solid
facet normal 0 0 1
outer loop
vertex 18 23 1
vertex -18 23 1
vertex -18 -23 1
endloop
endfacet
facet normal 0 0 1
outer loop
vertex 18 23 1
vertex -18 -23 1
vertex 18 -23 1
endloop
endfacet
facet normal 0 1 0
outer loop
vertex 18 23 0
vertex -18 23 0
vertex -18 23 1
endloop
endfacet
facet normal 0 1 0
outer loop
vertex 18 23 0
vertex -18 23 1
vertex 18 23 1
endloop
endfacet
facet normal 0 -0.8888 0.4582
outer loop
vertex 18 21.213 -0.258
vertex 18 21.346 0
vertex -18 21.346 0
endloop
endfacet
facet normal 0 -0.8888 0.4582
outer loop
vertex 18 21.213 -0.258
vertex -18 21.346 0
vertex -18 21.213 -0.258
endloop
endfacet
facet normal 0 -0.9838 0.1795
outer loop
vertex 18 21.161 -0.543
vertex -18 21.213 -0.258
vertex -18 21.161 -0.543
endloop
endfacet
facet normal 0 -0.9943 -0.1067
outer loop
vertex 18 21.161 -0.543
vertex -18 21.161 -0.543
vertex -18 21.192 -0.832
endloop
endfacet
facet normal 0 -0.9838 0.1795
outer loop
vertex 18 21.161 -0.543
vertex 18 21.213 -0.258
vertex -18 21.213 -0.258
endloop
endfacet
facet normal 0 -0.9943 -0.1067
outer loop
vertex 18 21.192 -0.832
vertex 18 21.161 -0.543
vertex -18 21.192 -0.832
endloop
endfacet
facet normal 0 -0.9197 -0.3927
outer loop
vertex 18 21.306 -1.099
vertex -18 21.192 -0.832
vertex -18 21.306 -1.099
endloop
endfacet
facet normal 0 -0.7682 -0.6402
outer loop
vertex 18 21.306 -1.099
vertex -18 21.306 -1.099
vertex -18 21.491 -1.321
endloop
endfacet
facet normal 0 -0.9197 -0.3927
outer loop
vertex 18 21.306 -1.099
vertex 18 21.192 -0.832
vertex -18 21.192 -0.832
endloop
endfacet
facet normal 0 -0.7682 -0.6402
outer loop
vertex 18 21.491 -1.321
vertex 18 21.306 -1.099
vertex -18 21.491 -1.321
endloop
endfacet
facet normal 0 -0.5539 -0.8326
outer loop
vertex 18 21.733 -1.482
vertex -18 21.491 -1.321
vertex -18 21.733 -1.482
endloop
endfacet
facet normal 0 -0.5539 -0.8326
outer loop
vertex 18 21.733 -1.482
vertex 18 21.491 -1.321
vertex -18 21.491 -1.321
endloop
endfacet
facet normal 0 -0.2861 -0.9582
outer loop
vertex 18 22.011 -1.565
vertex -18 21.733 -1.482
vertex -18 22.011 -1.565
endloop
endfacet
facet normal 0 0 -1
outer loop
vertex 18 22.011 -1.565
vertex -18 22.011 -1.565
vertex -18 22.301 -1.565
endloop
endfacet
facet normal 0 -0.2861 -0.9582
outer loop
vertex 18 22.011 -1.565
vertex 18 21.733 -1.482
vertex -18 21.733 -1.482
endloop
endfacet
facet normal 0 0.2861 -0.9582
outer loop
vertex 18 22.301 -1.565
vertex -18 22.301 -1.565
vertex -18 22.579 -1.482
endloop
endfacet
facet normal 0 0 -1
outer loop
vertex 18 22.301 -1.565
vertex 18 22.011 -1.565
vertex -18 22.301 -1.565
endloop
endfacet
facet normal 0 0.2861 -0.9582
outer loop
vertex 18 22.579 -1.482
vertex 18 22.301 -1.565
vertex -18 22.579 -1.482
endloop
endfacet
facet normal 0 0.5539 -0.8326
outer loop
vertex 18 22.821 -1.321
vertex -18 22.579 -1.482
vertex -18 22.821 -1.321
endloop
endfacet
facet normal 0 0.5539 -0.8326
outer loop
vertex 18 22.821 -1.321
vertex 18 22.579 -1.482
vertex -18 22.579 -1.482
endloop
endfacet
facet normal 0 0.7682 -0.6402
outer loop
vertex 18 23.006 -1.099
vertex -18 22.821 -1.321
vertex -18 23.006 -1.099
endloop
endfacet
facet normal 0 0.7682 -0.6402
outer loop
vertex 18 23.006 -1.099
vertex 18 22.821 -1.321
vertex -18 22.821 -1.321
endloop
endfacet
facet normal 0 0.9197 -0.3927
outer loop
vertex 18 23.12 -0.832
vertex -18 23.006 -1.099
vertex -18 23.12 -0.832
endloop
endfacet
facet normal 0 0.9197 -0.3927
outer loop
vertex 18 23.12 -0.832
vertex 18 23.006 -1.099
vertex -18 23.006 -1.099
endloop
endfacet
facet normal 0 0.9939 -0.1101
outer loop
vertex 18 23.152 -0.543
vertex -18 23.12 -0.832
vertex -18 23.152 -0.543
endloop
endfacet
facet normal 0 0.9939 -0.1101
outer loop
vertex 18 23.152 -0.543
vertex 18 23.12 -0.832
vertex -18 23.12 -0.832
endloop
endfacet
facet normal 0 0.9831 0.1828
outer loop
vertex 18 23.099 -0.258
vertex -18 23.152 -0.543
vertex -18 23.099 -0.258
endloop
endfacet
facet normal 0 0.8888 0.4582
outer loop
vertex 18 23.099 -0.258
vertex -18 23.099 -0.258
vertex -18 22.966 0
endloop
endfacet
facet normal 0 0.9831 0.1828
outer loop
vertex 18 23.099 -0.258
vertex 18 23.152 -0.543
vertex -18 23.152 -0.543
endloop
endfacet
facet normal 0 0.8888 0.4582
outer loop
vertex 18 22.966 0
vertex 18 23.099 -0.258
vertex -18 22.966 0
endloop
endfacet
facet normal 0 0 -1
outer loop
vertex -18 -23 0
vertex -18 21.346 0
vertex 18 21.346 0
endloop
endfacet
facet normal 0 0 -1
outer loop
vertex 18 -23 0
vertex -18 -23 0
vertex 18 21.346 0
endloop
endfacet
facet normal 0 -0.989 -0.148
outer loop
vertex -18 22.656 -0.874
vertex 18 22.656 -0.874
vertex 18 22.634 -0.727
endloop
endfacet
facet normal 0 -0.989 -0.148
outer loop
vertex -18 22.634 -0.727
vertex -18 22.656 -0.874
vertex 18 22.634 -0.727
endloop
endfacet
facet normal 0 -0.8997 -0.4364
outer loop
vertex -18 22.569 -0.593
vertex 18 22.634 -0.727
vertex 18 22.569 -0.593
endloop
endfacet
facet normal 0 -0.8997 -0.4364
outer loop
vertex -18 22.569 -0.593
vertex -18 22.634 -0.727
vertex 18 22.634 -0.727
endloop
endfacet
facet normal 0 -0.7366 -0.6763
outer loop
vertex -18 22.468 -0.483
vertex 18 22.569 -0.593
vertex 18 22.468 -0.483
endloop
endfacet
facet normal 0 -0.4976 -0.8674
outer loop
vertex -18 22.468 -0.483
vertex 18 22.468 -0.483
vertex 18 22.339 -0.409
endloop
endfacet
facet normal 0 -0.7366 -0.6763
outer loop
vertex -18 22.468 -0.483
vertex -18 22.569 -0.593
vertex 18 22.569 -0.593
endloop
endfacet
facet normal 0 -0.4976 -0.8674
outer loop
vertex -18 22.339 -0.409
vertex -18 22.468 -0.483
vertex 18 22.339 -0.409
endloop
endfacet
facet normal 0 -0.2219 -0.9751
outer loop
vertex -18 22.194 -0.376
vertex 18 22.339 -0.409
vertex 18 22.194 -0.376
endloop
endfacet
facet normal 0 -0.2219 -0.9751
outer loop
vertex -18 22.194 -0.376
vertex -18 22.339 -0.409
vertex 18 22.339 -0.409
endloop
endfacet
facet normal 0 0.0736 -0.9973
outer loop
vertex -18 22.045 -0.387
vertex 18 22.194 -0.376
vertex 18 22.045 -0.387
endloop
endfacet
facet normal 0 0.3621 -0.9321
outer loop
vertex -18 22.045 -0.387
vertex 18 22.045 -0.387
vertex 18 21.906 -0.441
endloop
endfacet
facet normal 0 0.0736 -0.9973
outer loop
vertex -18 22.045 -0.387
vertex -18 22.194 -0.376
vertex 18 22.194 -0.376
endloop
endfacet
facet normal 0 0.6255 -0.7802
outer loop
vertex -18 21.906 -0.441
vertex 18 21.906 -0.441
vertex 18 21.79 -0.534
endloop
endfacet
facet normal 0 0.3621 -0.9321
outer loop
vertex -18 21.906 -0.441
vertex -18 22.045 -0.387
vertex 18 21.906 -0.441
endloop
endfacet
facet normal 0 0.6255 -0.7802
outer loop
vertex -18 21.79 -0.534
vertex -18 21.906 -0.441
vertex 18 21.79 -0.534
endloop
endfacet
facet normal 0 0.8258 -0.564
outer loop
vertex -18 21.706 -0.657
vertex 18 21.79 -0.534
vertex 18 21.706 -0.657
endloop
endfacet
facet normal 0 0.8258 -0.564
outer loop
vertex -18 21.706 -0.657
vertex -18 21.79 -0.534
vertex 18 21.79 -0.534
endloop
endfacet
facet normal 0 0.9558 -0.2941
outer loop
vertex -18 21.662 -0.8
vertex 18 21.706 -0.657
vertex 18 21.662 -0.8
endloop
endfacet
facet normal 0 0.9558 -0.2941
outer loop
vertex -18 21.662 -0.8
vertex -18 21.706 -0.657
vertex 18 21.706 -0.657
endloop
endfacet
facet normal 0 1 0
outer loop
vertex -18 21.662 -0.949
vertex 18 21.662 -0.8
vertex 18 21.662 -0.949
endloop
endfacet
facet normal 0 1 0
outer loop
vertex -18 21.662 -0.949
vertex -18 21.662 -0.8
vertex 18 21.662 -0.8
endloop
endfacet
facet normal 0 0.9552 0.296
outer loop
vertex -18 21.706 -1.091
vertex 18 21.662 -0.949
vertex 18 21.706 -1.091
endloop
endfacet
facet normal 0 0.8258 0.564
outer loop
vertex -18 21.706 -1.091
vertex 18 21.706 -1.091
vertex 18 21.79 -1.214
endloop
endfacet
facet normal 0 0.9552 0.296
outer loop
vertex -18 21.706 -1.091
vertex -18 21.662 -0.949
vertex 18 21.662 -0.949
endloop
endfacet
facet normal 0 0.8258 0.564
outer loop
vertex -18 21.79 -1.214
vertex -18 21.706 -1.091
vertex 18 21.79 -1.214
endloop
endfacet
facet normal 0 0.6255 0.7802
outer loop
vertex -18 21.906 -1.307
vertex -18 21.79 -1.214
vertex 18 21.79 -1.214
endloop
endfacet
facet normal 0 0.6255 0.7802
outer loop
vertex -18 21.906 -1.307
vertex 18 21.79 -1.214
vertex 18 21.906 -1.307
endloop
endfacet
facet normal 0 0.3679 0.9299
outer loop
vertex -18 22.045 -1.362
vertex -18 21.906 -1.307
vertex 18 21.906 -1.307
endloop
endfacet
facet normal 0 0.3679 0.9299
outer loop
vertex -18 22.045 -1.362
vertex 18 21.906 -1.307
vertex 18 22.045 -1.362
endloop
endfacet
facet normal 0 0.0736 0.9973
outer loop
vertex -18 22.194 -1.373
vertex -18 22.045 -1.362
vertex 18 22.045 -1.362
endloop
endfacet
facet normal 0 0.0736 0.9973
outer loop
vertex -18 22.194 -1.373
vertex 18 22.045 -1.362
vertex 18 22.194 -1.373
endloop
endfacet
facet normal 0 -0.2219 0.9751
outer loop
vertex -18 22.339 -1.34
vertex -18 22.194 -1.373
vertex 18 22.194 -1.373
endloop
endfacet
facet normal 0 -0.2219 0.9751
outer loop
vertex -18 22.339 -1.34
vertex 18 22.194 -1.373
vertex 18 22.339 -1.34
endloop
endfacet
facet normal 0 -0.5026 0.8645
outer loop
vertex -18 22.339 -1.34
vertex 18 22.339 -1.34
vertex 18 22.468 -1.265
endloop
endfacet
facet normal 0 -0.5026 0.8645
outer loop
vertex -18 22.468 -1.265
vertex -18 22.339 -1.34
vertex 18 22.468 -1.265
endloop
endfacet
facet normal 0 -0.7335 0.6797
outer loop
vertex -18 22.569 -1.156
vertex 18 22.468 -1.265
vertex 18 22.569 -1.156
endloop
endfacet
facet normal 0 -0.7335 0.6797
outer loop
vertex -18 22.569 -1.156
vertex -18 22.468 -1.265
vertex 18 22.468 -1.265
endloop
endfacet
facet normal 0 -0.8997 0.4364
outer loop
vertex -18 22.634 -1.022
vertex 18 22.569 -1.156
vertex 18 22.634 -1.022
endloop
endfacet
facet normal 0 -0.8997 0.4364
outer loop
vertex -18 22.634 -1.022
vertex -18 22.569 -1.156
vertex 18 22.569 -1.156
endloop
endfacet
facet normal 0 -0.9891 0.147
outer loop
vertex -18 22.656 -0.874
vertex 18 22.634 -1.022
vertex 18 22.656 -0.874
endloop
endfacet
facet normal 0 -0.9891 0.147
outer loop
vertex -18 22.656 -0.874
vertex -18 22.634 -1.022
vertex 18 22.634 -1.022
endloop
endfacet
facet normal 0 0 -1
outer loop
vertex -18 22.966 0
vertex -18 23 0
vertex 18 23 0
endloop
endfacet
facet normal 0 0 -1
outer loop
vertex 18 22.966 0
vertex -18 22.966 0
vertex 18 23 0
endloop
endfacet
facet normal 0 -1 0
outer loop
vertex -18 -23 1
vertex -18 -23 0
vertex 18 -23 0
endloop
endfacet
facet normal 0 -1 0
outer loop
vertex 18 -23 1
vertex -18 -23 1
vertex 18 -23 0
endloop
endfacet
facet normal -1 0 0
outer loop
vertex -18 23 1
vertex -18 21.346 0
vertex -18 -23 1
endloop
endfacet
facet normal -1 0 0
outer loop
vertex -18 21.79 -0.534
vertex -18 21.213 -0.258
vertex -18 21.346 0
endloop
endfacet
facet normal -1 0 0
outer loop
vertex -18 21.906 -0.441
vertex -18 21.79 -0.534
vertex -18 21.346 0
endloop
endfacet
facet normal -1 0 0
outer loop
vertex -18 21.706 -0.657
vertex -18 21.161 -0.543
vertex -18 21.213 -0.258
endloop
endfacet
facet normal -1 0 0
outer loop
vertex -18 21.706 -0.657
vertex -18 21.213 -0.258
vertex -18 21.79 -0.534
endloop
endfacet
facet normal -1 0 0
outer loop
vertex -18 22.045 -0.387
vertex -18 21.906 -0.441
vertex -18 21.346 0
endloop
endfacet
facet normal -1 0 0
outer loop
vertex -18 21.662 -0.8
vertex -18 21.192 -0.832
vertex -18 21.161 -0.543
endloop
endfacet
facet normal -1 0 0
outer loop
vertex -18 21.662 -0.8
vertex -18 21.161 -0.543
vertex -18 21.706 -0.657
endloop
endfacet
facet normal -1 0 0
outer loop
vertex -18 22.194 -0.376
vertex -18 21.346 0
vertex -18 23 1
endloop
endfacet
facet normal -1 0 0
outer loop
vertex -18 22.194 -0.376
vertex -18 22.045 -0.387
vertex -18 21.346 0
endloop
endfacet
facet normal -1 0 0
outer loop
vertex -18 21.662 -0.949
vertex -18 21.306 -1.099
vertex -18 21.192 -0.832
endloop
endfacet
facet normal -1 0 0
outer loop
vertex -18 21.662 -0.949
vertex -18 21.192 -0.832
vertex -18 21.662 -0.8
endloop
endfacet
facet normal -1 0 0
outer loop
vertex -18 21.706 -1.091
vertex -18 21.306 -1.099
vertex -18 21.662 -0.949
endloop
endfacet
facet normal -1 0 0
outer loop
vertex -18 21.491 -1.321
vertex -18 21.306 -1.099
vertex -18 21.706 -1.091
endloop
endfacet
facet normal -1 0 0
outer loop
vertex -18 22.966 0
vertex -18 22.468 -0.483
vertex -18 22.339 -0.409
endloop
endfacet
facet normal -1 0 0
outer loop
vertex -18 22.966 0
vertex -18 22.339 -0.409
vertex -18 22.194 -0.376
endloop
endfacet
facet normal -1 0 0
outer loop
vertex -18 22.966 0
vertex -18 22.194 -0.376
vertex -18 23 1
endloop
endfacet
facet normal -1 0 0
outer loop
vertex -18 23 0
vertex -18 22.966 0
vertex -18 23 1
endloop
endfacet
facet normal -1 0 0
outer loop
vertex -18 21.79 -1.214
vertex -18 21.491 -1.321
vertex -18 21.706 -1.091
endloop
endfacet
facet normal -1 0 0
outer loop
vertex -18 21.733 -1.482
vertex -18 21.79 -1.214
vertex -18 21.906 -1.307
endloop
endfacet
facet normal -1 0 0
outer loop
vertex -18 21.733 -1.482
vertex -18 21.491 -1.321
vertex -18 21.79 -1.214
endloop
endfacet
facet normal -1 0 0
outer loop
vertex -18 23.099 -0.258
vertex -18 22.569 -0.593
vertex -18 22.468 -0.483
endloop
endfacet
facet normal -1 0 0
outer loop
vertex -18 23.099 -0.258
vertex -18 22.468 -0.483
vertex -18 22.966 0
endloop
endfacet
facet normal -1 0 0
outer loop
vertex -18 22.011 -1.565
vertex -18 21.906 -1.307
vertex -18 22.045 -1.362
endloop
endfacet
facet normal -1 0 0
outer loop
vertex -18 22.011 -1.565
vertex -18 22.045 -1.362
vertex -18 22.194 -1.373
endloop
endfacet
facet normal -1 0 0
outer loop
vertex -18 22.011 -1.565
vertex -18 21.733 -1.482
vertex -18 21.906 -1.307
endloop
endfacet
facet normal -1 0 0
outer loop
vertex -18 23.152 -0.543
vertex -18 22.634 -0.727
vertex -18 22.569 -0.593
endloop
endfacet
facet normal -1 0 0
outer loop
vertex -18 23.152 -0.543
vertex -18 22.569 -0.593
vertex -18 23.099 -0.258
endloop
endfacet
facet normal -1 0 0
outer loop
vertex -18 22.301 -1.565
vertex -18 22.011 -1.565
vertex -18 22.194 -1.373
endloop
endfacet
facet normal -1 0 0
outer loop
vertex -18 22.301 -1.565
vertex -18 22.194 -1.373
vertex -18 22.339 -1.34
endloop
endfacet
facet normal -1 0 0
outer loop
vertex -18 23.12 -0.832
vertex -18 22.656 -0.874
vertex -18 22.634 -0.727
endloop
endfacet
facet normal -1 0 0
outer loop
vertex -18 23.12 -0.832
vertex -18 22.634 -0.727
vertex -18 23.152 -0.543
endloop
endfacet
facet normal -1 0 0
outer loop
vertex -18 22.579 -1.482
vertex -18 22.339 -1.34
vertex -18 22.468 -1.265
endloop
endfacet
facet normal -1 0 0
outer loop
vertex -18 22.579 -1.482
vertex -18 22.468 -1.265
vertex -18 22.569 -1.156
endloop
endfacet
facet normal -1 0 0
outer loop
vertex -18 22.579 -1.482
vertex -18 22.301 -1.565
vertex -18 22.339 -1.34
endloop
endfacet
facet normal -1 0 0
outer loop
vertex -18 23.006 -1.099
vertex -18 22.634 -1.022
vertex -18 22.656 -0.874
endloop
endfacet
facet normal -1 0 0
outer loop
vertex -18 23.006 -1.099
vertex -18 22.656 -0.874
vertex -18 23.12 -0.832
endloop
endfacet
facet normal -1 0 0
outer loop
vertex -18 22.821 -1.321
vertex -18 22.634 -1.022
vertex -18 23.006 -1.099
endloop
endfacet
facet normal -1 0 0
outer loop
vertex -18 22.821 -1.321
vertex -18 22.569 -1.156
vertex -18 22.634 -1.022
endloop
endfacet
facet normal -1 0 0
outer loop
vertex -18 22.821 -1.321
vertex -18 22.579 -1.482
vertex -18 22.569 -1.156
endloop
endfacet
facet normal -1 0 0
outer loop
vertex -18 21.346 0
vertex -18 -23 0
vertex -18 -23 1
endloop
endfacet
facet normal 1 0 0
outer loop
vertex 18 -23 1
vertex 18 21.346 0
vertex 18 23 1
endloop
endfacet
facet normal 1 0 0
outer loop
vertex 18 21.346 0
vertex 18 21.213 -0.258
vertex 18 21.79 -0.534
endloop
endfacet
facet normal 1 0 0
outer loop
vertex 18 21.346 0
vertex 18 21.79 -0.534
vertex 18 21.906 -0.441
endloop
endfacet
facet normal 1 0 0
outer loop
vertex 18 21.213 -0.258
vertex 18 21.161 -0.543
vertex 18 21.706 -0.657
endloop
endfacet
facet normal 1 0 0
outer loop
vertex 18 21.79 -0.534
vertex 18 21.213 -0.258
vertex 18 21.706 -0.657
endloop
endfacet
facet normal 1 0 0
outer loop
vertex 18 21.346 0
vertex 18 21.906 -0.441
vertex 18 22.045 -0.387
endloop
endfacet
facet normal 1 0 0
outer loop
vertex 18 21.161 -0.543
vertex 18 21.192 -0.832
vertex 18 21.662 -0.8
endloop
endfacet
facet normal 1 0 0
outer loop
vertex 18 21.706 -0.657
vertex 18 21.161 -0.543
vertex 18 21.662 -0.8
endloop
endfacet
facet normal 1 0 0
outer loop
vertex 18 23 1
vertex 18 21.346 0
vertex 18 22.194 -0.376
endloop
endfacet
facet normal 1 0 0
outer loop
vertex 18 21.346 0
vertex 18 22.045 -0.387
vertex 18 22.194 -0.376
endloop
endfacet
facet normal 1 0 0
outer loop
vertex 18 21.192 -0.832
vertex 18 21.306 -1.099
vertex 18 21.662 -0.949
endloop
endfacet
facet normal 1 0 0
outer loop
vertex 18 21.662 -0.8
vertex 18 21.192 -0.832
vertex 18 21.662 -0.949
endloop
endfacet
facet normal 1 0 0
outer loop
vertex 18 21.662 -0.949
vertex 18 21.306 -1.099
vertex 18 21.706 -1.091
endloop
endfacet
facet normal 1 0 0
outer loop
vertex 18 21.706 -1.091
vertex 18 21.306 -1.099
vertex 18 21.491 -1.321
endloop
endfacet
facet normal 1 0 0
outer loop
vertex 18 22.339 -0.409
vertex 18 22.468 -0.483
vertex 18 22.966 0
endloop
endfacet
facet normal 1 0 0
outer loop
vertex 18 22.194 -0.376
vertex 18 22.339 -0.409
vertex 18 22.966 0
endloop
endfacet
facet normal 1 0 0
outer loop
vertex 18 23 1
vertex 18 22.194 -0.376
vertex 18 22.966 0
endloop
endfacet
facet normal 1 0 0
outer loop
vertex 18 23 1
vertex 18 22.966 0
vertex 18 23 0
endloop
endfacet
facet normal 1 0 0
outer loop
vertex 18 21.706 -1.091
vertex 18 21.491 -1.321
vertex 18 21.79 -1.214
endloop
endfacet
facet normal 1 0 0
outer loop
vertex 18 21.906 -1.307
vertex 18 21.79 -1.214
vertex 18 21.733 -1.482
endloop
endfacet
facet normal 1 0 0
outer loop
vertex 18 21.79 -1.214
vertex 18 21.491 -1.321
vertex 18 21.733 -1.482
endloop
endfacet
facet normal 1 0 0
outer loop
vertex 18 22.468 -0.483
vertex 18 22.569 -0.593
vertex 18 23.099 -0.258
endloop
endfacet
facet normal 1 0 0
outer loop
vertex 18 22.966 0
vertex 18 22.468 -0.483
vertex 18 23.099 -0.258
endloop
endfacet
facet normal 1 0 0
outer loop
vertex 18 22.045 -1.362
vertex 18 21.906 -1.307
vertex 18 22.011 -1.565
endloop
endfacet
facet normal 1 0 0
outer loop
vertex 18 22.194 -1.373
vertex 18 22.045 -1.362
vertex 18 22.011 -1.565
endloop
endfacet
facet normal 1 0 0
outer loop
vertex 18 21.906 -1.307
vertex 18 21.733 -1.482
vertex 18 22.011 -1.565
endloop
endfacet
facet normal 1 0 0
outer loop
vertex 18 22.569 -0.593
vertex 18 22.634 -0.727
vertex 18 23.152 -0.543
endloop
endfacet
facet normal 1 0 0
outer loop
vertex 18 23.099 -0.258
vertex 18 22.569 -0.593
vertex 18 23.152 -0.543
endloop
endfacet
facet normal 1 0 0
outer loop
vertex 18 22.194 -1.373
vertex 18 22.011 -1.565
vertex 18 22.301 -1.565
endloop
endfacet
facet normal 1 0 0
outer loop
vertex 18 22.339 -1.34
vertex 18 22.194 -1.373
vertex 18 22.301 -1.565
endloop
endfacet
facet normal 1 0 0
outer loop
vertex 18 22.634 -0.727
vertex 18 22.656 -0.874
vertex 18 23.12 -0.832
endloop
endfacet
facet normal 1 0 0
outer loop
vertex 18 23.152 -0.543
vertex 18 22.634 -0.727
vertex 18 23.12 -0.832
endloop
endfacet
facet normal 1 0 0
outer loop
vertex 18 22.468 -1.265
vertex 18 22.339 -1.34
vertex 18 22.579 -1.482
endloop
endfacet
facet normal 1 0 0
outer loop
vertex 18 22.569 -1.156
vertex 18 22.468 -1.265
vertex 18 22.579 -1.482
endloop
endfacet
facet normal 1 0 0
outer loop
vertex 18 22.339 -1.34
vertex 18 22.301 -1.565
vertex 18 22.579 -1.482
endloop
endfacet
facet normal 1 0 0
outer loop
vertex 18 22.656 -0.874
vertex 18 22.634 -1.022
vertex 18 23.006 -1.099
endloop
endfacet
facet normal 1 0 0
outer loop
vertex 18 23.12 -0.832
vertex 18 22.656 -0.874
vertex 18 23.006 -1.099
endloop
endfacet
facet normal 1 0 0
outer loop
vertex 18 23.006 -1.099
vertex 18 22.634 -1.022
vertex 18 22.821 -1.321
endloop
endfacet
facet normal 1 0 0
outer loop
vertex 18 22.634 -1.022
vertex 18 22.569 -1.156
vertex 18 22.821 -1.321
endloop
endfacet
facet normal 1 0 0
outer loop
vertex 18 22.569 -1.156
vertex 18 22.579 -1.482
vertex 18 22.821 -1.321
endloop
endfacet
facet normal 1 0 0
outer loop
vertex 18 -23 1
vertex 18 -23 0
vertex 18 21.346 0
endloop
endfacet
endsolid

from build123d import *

# Parameters (mm, degrees)
F0_W     = 36
F0_H     = 46
F1_DEPTH = 1
F2_R     = 0.5
F3_DEPTH = 18


with BuildPart() as f1:
    # F0 (on Top) → F1 (new body)
    with BuildSketch(Plane.XY):
        Rectangle(F0_W, F0_H)
    extrude(amount=F1_DEPTH)

    # F2 (on Right) → F3 (join, symmetric)
    with BuildSketch(Plane.YZ):
        with BuildLine():
            Line((22.966417, 0), (21.345964, 0))
            ThreePointArc((21.345964, 0), (22.15619, -1.575722), (22.966417, 0))
        make_face()
        with Locations((22.15619, -0.874182)):
            Circle(F2_R, mode=Mode.SUBTRACT)
    extrude(amount=F3_DEPTH, both=True)


solid = f1.part
